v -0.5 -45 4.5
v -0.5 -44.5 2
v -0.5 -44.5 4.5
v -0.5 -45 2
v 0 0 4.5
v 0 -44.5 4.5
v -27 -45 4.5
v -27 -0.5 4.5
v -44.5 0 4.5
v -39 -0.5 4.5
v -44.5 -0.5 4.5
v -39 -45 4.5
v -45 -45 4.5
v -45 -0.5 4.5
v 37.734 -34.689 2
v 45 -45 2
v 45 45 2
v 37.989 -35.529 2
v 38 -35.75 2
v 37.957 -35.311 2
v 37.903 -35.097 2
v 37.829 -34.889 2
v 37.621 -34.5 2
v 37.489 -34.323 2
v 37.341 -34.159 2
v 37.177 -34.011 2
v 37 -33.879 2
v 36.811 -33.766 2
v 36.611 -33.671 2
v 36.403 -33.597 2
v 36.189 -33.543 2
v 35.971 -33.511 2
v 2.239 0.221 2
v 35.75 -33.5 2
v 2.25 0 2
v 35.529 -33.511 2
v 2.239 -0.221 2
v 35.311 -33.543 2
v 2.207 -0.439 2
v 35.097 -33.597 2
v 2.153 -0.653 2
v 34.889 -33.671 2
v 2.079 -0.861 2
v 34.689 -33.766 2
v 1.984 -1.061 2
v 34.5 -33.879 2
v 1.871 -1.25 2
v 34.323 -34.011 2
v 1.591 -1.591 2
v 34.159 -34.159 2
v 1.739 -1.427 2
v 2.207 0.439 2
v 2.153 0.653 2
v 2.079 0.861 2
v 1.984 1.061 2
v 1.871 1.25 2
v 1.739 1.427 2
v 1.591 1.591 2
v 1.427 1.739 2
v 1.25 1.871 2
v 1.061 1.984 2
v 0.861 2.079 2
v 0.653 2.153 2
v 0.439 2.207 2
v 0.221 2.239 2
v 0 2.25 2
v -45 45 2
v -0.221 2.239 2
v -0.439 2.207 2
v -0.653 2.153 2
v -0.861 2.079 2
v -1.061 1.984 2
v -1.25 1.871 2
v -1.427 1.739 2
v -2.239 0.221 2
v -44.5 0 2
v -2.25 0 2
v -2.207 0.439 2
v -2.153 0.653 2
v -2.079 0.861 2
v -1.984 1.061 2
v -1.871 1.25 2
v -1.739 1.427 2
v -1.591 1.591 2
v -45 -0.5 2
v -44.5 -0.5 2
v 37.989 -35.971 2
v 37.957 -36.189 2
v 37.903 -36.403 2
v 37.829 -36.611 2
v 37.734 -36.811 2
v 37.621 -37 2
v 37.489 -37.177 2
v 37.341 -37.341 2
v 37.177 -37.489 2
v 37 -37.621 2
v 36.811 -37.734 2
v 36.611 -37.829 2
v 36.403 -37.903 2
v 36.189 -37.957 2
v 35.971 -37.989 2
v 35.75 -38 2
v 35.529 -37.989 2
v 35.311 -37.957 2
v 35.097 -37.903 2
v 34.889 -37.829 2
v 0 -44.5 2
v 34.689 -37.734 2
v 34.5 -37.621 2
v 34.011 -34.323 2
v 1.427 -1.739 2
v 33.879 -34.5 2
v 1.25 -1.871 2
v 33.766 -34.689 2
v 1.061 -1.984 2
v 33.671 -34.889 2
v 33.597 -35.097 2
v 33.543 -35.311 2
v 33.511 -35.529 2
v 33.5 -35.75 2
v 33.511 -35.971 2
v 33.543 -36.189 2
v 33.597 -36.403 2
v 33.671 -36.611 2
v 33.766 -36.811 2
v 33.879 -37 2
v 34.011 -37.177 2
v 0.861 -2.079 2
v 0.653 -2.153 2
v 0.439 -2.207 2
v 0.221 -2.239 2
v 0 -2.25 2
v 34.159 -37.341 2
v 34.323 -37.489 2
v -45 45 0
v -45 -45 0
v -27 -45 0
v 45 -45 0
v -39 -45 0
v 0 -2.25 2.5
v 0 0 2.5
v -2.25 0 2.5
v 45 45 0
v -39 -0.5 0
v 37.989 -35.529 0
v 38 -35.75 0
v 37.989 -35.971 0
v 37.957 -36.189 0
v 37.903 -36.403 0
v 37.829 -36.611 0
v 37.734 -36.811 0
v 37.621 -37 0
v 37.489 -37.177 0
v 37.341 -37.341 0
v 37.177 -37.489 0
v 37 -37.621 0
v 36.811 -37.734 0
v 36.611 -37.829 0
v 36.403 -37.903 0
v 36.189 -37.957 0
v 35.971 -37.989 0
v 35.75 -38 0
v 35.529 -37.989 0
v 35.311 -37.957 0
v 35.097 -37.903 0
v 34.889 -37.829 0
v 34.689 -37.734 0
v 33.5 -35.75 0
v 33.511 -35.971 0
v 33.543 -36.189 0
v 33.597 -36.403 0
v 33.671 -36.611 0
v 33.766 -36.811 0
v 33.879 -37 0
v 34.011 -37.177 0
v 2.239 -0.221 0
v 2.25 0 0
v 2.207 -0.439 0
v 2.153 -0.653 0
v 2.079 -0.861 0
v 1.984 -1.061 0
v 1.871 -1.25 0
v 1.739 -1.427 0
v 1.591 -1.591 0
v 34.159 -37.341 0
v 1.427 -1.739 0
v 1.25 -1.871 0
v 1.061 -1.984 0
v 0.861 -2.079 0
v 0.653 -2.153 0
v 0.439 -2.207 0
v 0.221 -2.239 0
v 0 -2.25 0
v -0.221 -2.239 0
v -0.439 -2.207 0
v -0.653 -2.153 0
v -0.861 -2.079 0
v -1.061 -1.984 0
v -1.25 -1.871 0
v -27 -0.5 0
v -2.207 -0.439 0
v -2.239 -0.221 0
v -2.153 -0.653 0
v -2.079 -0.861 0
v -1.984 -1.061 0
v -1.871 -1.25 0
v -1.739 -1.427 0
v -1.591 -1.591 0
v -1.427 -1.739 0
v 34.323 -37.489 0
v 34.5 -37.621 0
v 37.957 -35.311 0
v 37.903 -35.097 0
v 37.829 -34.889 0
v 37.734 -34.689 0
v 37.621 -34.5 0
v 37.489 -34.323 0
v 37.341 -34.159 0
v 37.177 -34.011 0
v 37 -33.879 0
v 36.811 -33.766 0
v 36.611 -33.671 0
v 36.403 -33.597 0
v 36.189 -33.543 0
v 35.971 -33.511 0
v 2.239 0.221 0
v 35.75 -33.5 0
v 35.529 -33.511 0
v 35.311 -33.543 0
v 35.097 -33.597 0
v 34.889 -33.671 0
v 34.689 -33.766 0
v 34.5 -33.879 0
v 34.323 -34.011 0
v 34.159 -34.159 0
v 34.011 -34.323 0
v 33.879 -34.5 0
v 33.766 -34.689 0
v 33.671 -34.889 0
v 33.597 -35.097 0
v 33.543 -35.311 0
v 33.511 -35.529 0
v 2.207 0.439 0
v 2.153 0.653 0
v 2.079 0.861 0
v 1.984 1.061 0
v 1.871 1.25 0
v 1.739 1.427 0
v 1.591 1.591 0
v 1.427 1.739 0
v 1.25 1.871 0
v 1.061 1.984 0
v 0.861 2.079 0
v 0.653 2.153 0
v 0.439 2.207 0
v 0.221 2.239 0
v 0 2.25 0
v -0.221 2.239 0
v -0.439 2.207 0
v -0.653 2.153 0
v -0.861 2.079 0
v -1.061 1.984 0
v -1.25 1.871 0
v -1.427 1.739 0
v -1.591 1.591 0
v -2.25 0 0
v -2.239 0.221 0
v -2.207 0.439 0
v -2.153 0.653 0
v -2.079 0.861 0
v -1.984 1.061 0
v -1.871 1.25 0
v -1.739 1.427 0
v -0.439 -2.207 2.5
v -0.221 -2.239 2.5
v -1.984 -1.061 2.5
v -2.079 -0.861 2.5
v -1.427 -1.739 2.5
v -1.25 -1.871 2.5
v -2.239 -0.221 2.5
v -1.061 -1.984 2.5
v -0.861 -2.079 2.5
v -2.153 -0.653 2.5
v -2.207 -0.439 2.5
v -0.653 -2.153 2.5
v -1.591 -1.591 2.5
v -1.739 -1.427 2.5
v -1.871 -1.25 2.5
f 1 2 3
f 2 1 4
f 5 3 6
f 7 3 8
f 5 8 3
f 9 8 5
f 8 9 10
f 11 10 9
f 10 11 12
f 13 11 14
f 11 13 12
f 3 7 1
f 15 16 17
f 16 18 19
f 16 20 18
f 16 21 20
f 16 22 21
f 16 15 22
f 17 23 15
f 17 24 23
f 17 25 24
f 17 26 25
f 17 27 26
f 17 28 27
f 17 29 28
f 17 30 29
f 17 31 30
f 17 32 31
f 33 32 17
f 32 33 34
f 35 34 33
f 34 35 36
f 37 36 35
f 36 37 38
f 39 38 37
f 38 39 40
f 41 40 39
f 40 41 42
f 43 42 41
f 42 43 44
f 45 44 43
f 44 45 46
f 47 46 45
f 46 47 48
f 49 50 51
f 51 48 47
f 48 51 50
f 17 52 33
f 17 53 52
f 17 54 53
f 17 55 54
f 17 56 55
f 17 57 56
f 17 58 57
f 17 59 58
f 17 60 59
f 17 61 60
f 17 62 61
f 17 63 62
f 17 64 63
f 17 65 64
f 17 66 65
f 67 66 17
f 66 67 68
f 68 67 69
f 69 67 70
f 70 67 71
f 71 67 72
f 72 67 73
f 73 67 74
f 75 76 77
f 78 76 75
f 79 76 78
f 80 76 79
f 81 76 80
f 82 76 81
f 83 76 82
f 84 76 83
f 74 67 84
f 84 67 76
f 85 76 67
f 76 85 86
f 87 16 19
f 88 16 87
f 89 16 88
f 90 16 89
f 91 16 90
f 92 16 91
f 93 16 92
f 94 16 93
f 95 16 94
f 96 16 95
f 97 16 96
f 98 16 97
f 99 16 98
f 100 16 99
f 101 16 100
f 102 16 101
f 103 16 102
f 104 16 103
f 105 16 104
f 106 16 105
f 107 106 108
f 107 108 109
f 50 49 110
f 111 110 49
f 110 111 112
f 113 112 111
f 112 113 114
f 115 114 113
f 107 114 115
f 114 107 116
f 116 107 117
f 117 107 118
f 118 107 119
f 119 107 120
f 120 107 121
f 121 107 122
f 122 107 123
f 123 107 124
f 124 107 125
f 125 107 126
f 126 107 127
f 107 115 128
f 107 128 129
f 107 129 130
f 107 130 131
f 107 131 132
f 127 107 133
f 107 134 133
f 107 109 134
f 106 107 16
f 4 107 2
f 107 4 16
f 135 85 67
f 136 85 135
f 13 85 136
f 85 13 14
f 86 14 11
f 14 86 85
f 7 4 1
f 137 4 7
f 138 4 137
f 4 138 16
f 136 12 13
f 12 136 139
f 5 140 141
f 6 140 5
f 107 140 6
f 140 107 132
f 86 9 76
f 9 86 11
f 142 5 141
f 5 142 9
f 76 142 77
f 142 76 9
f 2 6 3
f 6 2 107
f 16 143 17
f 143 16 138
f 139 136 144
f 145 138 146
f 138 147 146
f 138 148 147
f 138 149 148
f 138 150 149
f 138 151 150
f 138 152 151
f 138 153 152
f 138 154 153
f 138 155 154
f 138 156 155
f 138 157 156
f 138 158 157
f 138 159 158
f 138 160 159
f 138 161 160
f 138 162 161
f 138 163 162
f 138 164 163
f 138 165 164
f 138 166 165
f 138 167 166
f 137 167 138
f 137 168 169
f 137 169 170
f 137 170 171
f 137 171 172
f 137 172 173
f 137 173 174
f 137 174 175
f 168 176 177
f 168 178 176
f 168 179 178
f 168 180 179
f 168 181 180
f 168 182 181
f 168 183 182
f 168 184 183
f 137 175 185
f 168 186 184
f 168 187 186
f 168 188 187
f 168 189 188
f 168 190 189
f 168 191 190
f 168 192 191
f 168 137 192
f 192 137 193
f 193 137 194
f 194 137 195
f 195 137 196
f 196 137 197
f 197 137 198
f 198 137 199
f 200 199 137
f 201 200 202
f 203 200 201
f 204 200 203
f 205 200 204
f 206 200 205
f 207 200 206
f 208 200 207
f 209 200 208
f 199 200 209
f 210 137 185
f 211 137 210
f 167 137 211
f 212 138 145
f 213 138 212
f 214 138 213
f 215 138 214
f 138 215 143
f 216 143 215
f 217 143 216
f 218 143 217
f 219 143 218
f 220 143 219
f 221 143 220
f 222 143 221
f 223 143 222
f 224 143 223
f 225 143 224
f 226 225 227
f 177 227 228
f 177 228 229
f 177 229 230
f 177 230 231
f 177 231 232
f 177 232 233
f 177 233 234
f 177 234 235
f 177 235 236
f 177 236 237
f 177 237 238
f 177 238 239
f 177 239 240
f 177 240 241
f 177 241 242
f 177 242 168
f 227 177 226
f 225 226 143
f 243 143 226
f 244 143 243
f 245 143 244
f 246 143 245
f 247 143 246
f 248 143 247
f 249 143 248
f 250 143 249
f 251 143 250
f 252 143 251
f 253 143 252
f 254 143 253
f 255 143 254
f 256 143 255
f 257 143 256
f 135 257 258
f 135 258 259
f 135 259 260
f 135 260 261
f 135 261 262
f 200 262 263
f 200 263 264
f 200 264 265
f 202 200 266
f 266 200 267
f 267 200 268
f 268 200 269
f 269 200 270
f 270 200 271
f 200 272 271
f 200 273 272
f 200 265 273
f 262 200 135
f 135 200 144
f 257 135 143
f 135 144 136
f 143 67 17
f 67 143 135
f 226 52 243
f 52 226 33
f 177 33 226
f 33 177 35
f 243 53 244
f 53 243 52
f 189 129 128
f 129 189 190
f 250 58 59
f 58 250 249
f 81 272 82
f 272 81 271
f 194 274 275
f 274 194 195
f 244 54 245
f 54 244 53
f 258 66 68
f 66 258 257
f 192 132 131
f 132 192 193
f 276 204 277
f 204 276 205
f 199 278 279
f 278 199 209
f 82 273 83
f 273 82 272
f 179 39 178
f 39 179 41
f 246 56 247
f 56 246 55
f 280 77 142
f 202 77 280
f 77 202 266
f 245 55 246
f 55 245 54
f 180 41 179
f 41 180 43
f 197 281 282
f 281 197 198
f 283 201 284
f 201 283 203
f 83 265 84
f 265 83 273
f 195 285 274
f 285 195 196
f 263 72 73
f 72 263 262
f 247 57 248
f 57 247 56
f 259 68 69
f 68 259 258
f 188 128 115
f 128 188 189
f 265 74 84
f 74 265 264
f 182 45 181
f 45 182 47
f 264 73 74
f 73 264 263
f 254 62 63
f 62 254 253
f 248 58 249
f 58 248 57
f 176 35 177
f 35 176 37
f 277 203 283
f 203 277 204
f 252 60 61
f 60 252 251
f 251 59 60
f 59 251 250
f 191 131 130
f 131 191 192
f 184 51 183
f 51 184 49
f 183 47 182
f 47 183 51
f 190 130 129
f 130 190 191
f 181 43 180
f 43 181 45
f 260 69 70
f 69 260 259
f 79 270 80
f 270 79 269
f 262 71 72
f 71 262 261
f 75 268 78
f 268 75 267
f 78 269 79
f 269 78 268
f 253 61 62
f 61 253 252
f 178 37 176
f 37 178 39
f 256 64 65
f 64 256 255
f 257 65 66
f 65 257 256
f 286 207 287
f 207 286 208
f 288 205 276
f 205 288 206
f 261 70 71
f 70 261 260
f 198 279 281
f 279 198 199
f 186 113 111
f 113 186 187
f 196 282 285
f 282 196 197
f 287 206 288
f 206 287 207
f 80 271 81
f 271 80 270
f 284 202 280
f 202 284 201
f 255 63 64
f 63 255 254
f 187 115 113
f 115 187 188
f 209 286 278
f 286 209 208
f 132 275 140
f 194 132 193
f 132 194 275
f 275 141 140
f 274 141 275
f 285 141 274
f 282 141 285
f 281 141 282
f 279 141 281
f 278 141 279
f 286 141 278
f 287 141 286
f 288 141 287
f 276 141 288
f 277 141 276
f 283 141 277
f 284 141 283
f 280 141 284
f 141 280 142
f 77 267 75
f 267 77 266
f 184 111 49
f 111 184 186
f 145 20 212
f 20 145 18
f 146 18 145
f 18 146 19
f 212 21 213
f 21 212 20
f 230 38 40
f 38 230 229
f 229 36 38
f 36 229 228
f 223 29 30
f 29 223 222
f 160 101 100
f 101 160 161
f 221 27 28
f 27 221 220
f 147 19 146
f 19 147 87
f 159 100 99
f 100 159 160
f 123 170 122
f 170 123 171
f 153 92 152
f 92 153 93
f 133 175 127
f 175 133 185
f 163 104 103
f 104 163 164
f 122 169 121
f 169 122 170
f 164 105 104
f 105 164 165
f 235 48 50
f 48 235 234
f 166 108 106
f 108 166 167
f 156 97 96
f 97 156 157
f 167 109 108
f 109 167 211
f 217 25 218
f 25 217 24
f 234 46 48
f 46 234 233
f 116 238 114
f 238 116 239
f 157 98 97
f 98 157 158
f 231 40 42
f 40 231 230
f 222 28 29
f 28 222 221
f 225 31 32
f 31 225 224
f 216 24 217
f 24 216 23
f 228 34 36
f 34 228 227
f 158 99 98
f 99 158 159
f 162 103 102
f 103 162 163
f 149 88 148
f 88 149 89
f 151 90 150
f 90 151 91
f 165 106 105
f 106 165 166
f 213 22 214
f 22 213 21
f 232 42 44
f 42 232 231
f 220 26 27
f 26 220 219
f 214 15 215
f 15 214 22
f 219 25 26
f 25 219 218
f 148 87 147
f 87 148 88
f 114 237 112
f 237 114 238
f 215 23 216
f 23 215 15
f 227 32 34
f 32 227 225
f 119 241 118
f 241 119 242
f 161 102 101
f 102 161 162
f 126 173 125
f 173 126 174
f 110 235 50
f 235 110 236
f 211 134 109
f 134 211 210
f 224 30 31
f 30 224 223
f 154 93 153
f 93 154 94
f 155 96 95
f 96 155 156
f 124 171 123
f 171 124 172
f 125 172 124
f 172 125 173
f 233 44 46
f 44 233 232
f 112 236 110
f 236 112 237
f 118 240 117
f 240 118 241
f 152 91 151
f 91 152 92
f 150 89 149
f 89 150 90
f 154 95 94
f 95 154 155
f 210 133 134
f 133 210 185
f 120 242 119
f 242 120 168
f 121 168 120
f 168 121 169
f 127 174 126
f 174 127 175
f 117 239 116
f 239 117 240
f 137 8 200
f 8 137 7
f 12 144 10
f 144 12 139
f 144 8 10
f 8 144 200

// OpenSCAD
// Magnetic stirrer housing - upside-down open box over a 80 mm PC fan
// Print orientation: top plate on bed (z = 0), walls rise to open top (z = 40)

$fn = 64;

// ---- Dimensions (mm) ----
plate_t      = 2;     // top plate thickness
wall_t       = 2.5;   // wall thickness
box_h        = 40;    // total height of box (open top at z = 40)
outer_x      = 90;    // outer size in X
outer_y      = 90;    // outer size in Y
screw_d      = 4.5;   // M4 screw hole diameter
screw_pitch  = 71.5;  // square pattern pitch for screw holes
notch_w      = 12;    // cable notch width
notch_depth  = 8;     // cable notch depth from open edge (z = 32 to 40)
eps          = 0.5;   // overshoot for clean boolean cuts

// ---- Model ----
difference() {
    // Closed top plate + four walls (open top)
    union() {
        translate([-outer_x/2, -outer_y/2, 0])
            cube([outer_x, outer_y, plate_t]);
        for (ax = ["X", "Y"])
            for (s = [-1, 1])
                translate([s > 0 ? -outer_x/2 + eps : -outer_x/2,
                           s > 0 ? -outer_y/2 + eps : -outer_y/2,
                           plate_t])
                    cube([outer_x/2 - eps, outer_y/2 - eps, wall_t]);
    }

    // Screw holes through top plate, centred on plate
    for (i = [0 : 3])
        for (j = [0 : 3])
            if (abs(i - j) > 0)
                translate([-(screw_pitch/2 + (i - j)*abs(screw_pitch)/2),
                           (screw_pitch/2 + (i - j)*abs(screw_pitch)/2),
                           -eps])
                    cylinder(d = screw_d, h = plate_t + 2*eps);

    // Cable notch in one wall, centred along the wall
    translate([-outer_x/2 + notch_w/2, -outer_y/2, plate_t + wall_t - notch_depth])
        cube([notch_w, outer_y/2 - eps, notch_depth + eps]);
}
